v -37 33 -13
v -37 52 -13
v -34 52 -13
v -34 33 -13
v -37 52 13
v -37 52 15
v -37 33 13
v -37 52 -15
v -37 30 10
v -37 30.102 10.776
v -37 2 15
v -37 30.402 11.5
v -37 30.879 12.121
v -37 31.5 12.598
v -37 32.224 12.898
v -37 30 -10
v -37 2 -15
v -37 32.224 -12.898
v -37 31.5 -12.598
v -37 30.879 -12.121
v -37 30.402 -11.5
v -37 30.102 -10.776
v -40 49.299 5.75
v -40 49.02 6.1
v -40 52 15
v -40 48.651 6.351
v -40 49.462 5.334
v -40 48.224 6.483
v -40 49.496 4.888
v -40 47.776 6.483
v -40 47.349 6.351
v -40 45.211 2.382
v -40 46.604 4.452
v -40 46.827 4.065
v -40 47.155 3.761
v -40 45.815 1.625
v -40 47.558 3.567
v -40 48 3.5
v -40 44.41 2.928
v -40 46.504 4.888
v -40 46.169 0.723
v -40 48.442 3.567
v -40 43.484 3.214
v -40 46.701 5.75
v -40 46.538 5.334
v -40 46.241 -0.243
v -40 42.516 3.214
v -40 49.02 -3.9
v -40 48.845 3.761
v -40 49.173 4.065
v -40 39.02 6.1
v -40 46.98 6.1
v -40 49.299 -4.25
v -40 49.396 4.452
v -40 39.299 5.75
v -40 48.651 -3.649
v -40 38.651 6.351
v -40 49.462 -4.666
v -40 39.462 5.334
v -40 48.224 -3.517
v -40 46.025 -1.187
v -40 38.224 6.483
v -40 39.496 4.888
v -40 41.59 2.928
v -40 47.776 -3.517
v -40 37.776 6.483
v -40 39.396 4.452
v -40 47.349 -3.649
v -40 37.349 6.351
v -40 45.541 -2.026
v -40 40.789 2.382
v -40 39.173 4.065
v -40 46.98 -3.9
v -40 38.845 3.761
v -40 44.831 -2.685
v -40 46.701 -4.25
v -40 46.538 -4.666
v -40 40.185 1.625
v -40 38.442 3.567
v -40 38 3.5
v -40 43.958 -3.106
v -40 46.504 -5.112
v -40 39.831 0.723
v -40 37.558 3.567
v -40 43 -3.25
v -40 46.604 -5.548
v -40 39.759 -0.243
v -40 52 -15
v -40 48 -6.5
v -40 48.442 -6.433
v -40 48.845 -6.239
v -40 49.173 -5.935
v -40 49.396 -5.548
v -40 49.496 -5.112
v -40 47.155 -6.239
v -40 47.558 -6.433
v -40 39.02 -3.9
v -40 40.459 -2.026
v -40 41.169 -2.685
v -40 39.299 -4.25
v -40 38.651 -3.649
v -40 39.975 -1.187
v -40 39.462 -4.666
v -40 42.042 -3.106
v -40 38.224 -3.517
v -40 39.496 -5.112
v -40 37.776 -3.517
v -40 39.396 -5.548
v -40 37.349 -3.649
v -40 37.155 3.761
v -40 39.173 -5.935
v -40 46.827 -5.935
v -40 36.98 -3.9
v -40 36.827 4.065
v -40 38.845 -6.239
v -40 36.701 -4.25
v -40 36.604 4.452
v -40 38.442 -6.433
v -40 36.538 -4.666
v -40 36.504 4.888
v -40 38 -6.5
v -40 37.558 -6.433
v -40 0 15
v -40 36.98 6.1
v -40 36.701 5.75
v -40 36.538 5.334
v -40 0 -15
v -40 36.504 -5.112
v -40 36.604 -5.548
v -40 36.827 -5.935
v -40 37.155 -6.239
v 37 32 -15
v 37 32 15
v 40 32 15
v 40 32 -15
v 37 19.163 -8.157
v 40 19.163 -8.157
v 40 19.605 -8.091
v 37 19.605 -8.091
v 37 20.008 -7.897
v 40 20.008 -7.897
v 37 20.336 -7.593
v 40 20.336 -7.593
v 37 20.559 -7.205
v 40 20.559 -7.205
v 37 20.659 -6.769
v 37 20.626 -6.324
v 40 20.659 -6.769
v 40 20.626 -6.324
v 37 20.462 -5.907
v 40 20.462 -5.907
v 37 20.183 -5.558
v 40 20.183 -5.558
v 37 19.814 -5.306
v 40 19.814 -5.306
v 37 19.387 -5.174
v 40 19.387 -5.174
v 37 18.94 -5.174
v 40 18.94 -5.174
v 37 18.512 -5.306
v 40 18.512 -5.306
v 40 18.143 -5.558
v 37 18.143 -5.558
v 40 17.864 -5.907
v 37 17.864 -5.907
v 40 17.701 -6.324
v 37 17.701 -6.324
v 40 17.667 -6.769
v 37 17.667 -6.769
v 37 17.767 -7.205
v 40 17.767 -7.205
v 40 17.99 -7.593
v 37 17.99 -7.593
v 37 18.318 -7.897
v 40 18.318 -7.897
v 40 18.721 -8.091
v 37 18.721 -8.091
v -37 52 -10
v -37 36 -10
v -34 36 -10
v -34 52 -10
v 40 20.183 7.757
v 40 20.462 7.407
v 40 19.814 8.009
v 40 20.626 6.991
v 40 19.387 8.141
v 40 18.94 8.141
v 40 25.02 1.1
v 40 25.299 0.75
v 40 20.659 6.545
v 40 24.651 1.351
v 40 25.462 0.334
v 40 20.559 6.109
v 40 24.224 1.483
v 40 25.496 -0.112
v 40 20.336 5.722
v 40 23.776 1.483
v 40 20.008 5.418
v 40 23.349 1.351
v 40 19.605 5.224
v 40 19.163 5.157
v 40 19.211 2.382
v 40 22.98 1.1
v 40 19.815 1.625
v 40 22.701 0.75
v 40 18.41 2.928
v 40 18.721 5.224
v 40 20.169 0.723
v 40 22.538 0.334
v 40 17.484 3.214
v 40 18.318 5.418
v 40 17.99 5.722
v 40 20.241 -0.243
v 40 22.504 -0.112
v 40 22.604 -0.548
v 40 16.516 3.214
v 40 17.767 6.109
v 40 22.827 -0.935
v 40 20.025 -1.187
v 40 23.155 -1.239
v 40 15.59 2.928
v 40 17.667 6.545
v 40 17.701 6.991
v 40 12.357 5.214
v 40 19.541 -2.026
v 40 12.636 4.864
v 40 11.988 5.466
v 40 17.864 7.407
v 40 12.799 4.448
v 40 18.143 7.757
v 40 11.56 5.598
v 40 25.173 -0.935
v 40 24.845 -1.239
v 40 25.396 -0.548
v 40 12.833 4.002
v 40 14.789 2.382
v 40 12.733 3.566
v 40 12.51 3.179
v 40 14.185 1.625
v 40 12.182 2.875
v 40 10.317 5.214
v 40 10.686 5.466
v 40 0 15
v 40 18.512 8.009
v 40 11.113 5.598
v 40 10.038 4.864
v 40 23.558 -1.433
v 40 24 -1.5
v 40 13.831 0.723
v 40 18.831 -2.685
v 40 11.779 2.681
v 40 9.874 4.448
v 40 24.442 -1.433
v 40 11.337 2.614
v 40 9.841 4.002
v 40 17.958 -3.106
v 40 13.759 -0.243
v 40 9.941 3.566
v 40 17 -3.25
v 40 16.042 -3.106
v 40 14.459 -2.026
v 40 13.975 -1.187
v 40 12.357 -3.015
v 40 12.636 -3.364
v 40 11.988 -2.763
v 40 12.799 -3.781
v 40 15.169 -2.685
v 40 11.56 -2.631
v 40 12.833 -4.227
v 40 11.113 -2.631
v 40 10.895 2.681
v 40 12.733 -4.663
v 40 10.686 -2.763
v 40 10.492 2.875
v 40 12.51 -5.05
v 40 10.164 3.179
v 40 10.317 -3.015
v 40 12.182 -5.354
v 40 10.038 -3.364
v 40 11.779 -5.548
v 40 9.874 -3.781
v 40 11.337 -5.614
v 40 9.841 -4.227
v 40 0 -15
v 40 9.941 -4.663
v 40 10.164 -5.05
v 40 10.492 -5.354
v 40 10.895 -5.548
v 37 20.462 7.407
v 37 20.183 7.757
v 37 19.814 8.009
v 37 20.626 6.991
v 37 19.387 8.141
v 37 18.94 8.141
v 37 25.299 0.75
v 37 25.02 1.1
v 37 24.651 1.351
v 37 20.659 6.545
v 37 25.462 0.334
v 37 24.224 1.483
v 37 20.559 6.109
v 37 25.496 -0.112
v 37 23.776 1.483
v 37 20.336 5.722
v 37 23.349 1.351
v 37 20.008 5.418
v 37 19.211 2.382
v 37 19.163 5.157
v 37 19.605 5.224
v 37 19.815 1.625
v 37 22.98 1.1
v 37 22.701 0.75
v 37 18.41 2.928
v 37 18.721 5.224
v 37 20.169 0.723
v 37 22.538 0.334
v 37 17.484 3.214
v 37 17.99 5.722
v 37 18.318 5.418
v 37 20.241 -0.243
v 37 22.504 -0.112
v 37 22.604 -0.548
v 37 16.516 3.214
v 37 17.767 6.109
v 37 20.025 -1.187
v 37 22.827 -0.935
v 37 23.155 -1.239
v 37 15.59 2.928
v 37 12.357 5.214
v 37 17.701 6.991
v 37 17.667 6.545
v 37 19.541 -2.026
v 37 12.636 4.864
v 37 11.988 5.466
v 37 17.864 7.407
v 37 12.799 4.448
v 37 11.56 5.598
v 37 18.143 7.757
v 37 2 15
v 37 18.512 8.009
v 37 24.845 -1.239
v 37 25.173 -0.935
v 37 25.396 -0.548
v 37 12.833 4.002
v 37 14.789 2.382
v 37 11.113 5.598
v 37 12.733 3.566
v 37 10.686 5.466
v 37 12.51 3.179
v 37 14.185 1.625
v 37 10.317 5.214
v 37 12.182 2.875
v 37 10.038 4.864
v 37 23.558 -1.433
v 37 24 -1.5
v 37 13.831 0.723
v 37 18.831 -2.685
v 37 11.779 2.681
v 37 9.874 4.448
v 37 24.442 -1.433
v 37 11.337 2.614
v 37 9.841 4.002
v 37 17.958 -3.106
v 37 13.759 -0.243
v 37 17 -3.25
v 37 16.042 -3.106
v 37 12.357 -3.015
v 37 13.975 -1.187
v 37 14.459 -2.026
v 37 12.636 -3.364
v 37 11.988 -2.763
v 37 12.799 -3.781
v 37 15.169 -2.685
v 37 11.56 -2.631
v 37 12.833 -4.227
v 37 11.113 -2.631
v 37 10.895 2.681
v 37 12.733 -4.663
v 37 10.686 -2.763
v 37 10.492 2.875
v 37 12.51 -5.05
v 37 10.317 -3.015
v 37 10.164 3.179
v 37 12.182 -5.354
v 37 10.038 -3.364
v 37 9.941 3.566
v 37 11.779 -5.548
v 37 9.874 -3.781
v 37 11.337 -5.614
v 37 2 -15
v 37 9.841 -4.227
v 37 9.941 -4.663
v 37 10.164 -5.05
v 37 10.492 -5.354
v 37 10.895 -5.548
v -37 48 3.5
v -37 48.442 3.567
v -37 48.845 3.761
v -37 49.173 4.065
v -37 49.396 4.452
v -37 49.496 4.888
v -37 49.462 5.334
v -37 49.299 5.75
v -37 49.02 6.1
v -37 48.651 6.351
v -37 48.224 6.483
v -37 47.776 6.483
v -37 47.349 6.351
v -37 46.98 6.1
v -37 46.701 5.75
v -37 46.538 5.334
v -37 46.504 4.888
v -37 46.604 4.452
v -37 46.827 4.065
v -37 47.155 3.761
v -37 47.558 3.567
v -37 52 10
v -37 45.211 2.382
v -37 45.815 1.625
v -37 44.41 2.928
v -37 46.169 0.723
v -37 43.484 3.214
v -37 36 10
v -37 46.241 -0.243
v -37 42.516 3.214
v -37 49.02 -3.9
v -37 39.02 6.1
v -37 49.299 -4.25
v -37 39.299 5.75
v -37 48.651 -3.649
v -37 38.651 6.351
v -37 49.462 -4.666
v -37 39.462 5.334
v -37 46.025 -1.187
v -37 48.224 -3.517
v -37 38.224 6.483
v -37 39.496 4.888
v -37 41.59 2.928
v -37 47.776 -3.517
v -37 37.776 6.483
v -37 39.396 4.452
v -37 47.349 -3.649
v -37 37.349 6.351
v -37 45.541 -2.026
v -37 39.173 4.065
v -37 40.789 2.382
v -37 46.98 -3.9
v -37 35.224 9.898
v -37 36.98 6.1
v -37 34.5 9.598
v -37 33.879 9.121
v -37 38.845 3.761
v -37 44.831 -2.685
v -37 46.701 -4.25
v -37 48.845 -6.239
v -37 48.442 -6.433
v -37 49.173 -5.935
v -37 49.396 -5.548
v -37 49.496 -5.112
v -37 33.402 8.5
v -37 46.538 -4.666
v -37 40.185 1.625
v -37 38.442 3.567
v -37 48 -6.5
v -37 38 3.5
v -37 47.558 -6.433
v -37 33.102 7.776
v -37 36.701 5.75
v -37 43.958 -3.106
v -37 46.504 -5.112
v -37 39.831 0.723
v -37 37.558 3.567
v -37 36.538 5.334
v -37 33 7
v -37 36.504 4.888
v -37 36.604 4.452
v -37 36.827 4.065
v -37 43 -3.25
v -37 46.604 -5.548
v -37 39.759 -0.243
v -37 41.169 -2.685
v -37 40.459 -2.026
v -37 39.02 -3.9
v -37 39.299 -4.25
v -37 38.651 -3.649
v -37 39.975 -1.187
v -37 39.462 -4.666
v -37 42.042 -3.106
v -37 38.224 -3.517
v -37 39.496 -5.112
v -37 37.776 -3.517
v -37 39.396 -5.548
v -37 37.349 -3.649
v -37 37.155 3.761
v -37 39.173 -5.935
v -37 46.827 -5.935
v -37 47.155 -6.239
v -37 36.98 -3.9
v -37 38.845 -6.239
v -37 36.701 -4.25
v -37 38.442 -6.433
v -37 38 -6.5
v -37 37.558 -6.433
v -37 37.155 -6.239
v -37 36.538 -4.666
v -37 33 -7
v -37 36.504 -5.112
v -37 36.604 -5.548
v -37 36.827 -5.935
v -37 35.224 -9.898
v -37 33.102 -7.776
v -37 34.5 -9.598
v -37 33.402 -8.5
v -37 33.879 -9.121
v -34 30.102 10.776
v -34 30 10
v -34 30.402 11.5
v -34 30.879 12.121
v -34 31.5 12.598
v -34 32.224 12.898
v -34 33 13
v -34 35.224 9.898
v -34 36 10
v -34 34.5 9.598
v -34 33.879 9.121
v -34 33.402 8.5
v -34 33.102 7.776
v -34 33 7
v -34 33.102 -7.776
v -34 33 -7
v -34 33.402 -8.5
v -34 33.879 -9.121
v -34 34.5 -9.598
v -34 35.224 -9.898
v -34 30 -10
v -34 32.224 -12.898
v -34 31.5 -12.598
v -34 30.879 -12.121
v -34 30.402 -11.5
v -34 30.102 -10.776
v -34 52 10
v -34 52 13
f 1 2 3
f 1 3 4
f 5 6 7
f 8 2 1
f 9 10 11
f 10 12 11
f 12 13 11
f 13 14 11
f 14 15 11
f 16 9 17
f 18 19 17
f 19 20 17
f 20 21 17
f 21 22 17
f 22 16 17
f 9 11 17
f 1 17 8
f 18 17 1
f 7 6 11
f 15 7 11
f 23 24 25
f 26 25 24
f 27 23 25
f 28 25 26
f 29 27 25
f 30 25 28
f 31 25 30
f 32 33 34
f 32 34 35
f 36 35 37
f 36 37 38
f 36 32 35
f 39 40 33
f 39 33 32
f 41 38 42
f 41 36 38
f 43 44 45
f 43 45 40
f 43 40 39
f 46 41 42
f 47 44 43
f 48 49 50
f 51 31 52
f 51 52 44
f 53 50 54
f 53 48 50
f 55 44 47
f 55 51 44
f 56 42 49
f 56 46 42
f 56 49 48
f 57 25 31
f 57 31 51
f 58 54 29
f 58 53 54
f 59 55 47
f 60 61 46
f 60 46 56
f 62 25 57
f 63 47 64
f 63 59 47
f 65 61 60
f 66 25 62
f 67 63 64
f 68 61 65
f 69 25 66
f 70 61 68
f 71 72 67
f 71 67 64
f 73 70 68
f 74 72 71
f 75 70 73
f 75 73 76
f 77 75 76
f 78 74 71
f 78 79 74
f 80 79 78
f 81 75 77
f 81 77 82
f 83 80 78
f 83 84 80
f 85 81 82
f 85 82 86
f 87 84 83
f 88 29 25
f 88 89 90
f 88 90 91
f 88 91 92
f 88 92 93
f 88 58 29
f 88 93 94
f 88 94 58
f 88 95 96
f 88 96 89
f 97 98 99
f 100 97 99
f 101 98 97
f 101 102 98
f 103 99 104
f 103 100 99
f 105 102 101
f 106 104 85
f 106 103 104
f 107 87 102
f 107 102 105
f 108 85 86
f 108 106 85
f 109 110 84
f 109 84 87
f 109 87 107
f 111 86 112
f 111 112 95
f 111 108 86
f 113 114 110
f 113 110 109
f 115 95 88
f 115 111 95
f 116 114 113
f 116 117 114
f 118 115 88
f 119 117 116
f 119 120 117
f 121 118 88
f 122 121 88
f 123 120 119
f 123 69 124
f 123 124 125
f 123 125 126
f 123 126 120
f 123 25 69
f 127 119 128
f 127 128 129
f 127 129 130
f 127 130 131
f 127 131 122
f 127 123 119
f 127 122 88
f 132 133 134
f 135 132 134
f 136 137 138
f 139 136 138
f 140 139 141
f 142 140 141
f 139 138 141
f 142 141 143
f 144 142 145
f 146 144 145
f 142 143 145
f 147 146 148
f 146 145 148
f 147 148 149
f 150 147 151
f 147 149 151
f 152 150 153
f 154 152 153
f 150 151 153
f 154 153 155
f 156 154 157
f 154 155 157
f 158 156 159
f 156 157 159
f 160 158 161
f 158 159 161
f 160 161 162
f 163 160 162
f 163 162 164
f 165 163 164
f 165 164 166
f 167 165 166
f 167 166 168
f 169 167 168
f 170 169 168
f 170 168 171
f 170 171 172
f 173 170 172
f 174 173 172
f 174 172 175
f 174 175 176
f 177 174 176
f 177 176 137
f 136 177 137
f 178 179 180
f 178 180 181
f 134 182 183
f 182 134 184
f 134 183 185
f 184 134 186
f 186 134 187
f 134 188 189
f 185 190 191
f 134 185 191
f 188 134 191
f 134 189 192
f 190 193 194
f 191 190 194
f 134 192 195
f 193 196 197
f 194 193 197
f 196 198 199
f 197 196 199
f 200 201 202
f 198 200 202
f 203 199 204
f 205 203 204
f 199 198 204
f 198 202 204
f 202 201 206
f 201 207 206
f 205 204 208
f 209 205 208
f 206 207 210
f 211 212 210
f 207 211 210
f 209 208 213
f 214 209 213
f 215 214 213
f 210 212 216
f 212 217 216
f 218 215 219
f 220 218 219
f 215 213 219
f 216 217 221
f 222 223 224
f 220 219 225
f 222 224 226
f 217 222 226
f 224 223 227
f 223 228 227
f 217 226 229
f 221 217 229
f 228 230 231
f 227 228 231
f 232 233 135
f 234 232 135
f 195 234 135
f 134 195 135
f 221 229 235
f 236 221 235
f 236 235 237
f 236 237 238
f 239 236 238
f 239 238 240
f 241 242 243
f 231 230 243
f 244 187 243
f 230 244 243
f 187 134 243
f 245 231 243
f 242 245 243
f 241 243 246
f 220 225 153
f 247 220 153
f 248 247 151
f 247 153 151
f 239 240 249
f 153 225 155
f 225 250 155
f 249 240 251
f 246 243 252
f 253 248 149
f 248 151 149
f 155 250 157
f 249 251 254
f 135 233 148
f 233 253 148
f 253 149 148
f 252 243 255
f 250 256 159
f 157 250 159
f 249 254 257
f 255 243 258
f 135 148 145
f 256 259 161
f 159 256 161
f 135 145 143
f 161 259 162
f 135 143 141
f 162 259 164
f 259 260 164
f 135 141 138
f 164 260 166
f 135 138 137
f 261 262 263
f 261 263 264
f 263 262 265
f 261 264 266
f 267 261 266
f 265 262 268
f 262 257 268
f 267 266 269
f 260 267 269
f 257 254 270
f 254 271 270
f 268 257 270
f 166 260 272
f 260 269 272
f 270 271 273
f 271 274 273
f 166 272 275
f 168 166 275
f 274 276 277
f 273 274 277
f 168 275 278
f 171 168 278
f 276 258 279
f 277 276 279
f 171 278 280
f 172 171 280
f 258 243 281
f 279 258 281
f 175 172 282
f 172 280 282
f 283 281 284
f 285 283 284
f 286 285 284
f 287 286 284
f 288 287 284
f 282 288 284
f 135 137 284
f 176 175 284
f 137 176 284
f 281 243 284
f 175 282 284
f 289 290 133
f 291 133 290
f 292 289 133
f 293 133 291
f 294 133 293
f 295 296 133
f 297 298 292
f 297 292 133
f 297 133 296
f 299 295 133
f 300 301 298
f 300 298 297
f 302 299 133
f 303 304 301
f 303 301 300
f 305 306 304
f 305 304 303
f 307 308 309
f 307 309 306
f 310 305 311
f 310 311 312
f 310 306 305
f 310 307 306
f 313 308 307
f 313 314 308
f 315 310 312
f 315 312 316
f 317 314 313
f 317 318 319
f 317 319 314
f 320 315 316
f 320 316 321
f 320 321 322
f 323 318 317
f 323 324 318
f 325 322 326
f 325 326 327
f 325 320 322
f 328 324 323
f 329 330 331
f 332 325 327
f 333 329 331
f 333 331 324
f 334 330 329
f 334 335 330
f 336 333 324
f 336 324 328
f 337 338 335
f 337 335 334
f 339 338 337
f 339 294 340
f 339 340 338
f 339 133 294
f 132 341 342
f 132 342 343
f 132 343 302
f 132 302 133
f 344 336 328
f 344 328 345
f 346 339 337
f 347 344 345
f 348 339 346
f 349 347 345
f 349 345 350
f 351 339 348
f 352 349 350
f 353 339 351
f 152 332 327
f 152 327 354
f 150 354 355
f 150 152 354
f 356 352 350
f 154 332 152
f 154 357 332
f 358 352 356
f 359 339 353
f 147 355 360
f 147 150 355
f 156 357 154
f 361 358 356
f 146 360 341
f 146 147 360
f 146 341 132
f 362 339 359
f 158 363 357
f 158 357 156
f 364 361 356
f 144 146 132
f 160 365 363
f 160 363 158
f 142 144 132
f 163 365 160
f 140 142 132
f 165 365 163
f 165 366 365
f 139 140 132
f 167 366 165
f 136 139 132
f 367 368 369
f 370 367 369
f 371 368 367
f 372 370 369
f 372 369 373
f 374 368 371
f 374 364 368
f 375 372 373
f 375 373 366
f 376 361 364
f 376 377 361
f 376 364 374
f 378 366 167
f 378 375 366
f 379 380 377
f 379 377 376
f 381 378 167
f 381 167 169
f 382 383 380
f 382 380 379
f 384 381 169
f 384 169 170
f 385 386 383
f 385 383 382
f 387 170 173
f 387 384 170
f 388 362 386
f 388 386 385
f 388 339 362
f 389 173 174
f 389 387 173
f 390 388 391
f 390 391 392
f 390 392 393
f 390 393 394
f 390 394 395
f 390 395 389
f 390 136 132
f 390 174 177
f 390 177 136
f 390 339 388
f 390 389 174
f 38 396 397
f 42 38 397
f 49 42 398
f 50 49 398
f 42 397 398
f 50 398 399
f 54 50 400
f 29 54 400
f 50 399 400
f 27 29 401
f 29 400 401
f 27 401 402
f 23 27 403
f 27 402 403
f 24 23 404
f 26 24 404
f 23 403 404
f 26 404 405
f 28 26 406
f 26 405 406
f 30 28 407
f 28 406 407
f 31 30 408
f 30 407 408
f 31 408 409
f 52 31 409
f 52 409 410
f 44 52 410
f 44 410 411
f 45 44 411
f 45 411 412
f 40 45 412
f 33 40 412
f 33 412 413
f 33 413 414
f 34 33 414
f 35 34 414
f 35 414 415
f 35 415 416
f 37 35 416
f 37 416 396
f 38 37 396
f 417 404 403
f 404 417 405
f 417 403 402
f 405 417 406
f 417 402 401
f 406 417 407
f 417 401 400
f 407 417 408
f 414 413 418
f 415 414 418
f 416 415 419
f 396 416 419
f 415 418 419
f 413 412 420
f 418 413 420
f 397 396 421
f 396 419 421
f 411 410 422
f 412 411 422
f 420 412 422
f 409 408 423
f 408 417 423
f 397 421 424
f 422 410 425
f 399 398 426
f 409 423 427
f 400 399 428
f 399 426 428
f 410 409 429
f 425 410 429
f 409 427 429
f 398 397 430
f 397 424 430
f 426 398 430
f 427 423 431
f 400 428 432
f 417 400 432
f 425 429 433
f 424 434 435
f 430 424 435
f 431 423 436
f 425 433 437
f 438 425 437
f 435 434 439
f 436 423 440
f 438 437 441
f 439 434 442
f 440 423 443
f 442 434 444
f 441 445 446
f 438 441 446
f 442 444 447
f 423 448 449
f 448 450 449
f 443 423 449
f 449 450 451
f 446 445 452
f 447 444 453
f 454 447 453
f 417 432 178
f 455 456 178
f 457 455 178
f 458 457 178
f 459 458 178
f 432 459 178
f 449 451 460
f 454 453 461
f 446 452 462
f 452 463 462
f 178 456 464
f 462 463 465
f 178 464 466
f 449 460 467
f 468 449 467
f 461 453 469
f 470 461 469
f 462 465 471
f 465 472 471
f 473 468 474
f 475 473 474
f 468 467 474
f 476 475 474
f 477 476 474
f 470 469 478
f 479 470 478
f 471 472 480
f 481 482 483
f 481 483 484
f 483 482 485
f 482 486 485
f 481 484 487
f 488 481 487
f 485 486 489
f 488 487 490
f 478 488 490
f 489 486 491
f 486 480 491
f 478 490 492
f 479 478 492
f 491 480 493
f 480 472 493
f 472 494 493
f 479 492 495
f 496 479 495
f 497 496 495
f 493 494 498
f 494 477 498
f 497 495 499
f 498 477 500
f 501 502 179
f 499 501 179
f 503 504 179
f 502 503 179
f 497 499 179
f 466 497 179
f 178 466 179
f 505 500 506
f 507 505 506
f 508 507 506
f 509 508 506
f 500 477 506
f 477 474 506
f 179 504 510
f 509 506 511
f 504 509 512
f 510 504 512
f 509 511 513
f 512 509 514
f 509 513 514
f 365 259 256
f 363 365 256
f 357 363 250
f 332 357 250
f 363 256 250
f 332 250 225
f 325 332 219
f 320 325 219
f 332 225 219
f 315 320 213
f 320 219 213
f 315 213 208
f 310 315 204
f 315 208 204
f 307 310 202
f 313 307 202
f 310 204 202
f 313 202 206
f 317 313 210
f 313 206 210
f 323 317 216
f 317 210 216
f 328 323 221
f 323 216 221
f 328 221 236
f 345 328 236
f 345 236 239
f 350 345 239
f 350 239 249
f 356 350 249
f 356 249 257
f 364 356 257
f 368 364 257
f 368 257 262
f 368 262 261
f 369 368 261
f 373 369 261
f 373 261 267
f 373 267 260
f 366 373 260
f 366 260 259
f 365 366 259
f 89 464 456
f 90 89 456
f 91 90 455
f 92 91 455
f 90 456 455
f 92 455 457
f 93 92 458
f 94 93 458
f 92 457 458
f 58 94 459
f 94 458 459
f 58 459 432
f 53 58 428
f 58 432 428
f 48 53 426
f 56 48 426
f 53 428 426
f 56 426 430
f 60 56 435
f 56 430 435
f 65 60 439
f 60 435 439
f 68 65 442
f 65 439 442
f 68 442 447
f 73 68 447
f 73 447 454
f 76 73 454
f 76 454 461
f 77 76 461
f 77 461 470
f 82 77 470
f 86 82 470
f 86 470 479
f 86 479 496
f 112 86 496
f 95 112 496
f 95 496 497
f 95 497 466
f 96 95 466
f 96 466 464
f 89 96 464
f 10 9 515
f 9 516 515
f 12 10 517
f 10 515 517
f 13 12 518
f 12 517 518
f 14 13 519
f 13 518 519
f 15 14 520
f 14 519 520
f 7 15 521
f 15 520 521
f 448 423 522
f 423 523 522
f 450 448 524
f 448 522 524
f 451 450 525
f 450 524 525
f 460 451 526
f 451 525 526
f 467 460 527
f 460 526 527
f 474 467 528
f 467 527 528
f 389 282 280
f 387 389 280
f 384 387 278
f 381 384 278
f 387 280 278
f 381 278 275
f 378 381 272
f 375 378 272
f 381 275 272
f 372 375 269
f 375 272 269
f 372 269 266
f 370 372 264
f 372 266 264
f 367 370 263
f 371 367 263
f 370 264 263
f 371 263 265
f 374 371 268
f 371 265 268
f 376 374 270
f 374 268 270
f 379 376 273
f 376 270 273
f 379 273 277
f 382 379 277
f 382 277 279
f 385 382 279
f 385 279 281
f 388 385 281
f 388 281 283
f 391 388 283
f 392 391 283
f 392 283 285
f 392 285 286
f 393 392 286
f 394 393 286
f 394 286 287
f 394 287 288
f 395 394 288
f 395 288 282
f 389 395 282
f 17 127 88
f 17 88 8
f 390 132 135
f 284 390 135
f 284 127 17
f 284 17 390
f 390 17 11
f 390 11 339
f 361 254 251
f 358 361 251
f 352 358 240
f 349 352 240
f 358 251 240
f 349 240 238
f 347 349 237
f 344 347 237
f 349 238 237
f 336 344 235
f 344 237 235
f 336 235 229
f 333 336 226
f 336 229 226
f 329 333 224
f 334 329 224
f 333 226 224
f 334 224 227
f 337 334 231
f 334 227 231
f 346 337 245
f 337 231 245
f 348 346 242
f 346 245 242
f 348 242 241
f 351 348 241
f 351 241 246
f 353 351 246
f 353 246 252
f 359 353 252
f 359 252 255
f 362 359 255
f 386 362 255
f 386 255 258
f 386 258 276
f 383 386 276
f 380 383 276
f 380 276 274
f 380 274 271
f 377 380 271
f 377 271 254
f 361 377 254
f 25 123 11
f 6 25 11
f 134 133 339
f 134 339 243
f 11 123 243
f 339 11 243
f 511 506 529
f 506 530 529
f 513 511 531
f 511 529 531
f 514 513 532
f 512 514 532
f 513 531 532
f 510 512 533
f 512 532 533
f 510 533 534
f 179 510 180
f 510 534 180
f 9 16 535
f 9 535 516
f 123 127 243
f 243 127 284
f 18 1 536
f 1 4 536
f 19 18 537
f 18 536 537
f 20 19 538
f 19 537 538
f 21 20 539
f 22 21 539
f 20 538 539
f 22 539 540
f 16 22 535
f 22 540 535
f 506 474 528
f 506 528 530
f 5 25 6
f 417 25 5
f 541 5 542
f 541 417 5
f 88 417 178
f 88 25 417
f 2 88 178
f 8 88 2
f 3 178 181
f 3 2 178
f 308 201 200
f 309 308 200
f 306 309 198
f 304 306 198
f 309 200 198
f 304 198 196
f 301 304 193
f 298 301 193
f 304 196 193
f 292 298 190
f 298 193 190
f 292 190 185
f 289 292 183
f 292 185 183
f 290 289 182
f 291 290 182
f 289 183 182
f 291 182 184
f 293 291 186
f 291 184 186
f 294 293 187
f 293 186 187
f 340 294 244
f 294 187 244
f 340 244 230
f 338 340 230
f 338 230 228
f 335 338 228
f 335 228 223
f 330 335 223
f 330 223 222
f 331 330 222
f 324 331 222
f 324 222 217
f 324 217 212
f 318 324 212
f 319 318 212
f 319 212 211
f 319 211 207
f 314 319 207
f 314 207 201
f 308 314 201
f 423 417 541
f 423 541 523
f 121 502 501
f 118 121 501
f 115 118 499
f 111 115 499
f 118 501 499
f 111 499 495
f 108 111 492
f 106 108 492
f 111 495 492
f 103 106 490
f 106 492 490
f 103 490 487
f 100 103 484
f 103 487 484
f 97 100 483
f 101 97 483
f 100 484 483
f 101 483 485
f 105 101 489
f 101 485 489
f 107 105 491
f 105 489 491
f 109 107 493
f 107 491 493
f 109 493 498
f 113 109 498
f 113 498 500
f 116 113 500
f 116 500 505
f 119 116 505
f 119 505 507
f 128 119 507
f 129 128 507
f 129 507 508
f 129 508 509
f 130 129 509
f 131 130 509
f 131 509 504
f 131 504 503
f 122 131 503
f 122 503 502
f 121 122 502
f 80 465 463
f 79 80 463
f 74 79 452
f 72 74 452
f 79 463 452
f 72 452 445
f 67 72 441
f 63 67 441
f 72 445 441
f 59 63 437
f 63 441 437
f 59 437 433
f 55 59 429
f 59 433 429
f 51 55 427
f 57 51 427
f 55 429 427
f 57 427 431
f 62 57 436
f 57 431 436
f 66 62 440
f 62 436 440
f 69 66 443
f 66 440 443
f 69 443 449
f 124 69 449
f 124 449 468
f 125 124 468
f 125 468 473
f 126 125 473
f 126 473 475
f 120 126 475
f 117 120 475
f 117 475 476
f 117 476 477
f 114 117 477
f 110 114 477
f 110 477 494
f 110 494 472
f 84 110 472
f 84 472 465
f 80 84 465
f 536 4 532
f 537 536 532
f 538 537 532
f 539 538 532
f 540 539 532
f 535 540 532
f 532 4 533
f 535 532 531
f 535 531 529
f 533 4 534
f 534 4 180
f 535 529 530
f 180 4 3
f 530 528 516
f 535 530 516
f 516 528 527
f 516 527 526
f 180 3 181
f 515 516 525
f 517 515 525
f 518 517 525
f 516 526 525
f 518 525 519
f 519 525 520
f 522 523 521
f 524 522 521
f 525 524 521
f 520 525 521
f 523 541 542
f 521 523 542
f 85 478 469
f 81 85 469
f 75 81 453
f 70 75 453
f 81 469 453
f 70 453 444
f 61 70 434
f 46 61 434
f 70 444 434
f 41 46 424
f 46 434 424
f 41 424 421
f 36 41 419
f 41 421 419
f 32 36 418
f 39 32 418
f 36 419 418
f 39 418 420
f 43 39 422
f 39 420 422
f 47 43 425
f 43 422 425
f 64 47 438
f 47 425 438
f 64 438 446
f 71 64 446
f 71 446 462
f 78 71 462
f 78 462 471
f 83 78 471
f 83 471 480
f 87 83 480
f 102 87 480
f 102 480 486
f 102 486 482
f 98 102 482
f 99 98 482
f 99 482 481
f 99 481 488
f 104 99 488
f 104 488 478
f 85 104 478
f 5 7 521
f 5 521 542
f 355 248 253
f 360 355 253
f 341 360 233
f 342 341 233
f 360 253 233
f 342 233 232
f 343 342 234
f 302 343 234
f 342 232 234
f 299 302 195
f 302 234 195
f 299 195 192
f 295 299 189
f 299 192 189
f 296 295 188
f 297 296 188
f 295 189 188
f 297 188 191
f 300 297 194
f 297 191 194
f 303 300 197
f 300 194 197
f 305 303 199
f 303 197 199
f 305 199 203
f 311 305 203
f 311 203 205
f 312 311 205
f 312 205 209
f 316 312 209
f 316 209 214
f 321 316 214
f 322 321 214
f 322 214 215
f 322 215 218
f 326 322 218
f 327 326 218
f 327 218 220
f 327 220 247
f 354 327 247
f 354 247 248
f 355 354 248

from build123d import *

# Parameters (mm, degrees)
SKETCH1_W            = 80
SKETCH1_H            = 30
CHASSIS_DEPTH        = 2
SKETCH2_W            = 3
SKETCH2_H            = 30
TALLVALVEWALL_DEPTH  = 50
SKETCH3_W            = 3
SKETCH3_H            = 30
SHORTVALVEWALL_DEPTH = 30
SKETCH4_R            = 1.5
SKETCH4_R_2          = 3.25
TALLVALVECUT_DEPTH   = 4
SHORTVALVECUT_REACH  = 82
SKETCH6_R            = 3.25
SKETCH6_R_2          = 1.5
TALLVALVELIP_DEPTH   = 3
LIPROUNDING_R        = 3


with BuildPart() as part:
    # Sketch1 → Chassis (new body)
    with BuildSketch(Plane(origin=(0, 0, 0), x_dir=(1, 0, 0), z_dir=(0, 1, 0))):
        Rectangle(SKETCH1_W, SKETCH1_H)
    extrude(amount=CHASSIS_DEPTH)

    # Sketch2 → TallValveWall (add)
    with BuildSketch(Plane(origin=(0, 2, 0), x_dir=(1, 0, 0), z_dir=(0, 1, 0))):
        with Locations((-38.5, 0)):
            Rectangle(SKETCH2_W, SKETCH2_H)
    extrude(amount=TALLVALVEWALL_DEPTH)

    # Sketch3 → ShortValveWall (add)
    with BuildSketch(Plane(origin=(0, 2, 0), x_dir=(1, 0, 0), z_dir=(0, 1, 0))):
        with Locations((38.5, 0)):
            Rectangle(SKETCH3_W, SKETCH3_H)
    extrude(amount=SHORTVALVEWALL_DEPTH)

    # Sketch4 → TallValveCut (cut, through all)
    with BuildSketch(Plane(origin=(-37, 0, 0), x_dir=(0, 0, -1), z_dir=(1, 0, 0))):
        with Locations((-5, 48)):
            Circle(SKETCH4_R)
        with Locations((5, 48)):
            Circle(SKETCH4_R)
        with Locations((5, 38)):
            Circle(SKETCH4_R)
        with Locations((-5, 38)):
            Circle(SKETCH4_R)
        with Locations((0, 43)):
            Circle(SKETCH4_R_2)
    extrude(amount=-TALLVALVECUT_DEPTH, mode=Mode.SUBTRACT)

    # Sketch6 → ShortValveCut (cut, up to next)
    with BuildSketch(Plane(origin=(40, 0, 0), x_dir=(0, 0, -1), z_dir=(1, 0, 0)), mode=Mode.PRIVATE) as shortvalvecut_sk1:
        with Locations((0, 17)):
            Circle(SKETCH6_R)
    shortvalvecut_tool1 = extrude(shortvalvecut_sk1.sketch, amount=-SHORTVALVECUT_REACH, mode=Mode.PRIVATE) & part.part
    add(shortvalvecut_tool1.solids().sort_by_distance((40, 17, 0))[0], mode=Mode.SUBTRACT)
    # Sketch6 → ShortValveCut (cut, up to next)
    with BuildSketch(Plane(origin=(40, 0, 0), x_dir=(0, 0, -1), z_dir=(1, 0, 0)), mode=Mode.PRIVATE) as shortvalvecut_sk2:
        with Locations((0, 24)):
            Circle(SKETCH6_R_2)
    shortvalvecut_tool2 = extrude(shortvalvecut_sk2.sketch, amount=-SHORTVALVECUT_REACH, mode=Mode.PRIVATE) & part.part
    add(shortvalvecut_tool2.solids().sort_by_distance((40, 24, 0))[0], mode=Mode.SUBTRACT)
    # Sketch6 → ShortValveCut (cut, up to next)
    with BuildSketch(Plane(origin=(40, 0, 0), x_dir=(0, 0, -1), z_dir=(1, 0, 0)), mode=Mode.PRIVATE) as shortvalvecut_sk3:
        with Locations((6.657395614, 19.163118961)):
            Circle(SKETCH6_R_2)
    shortvalvecut_tool3 = extrude(shortvalvecut_sk3.sketch, amount=-SHORTVALVECUT_REACH, mode=Mode.PRIVATE) & part.part
    add(shortvalvecut_tool3.solids().sort_by_distance((40, 19.163119, -6.657396))[0], mode=Mode.SUBTRACT)
    # Sketch6 → ShortValveCut (cut, up to next)
    with BuildSketch(Plane(origin=(40, 0, 0), x_dir=(0, 0, -1), z_dir=(1, 0, 0)), mode=Mode.PRIVATE) as shortvalvecut_sk4:
        with Locations((4.114496766, 11.336881039)):
            Circle(SKETCH6_R_2)
    shortvalvecut_tool4 = extrude(shortvalvecut_sk4.sketch, amount=-SHORTVALVECUT_REACH, mode=Mode.PRIVATE) & part.part
    add(shortvalvecut_tool4.solids().sort_by_distance((40, 11.336881, -4.114497))[0], mode=Mode.SUBTRACT)
    # Sketch6 → ShortValveCut (cut, up to next)
    with BuildSketch(Plane(origin=(40, 0, 0), x_dir=(0, 0, -1), z_dir=(1, 0, 0)), mode=Mode.PRIVATE) as shortvalvecut_sk5:
        with Locations((-4.114496766, 11.336881039)):
            Circle(SKETCH6_R_2)
    shortvalvecut_tool5 = extrude(shortvalvecut_sk5.sketch, amount=-SHORTVALVECUT_REACH, mode=Mode.PRIVATE) & part.part
    add(shortvalvecut_tool5.solids().sort_by_distance((40, 11.336881, 4.114497))[0], mode=Mode.SUBTRACT)
    # Sketch6 → ShortValveCut (cut, up to next)
    with BuildSketch(Plane(origin=(40, 0, 0), x_dir=(0, 0, -1), z_dir=(1, 0, 0)), mode=Mode.PRIVATE) as shortvalvecut_sk6:
        with Locations((-6.657395614, 19.163118961)):
            Circle(SKETCH6_R_2)
    shortvalvecut_tool6 = extrude(shortvalvecut_sk6.sketch, amount=-SHORTVALVECUT_REACH, mode=Mode.PRIVATE) & part.part
    add(shortvalvecut_tool6.solids().sort_by_distance((40, 19.163119, 6.657396))[0], mode=Mode.SUBTRACT)

    # Sketch7 → TallValveLip (add)
    with BuildSketch(Plane(origin=(-37, 0, 0), x_dir=(0, 0, -1), z_dir=(1, 0, 0))):
        Polygon((-13, 52), (-10, 52), (-10, 33), (10, 33), (10, 52), (13, 52), (13, 30), (-13, 30), align=None)
    extrude(amount=TALLVALVELIP_DEPTH)

    # LipRounding
    liprounding_edges = [part.edges().sort_by_distance(p)[0] for p in [
        (-35.5, 30, 13),
        (-35.5, 30, -13),
        (-35.5, 33, -10),
        (-35.5, 33, 10),
    ]]
    fillet(liprounding_edges, radius=LIPROUNDING_R)


solid = part.part
